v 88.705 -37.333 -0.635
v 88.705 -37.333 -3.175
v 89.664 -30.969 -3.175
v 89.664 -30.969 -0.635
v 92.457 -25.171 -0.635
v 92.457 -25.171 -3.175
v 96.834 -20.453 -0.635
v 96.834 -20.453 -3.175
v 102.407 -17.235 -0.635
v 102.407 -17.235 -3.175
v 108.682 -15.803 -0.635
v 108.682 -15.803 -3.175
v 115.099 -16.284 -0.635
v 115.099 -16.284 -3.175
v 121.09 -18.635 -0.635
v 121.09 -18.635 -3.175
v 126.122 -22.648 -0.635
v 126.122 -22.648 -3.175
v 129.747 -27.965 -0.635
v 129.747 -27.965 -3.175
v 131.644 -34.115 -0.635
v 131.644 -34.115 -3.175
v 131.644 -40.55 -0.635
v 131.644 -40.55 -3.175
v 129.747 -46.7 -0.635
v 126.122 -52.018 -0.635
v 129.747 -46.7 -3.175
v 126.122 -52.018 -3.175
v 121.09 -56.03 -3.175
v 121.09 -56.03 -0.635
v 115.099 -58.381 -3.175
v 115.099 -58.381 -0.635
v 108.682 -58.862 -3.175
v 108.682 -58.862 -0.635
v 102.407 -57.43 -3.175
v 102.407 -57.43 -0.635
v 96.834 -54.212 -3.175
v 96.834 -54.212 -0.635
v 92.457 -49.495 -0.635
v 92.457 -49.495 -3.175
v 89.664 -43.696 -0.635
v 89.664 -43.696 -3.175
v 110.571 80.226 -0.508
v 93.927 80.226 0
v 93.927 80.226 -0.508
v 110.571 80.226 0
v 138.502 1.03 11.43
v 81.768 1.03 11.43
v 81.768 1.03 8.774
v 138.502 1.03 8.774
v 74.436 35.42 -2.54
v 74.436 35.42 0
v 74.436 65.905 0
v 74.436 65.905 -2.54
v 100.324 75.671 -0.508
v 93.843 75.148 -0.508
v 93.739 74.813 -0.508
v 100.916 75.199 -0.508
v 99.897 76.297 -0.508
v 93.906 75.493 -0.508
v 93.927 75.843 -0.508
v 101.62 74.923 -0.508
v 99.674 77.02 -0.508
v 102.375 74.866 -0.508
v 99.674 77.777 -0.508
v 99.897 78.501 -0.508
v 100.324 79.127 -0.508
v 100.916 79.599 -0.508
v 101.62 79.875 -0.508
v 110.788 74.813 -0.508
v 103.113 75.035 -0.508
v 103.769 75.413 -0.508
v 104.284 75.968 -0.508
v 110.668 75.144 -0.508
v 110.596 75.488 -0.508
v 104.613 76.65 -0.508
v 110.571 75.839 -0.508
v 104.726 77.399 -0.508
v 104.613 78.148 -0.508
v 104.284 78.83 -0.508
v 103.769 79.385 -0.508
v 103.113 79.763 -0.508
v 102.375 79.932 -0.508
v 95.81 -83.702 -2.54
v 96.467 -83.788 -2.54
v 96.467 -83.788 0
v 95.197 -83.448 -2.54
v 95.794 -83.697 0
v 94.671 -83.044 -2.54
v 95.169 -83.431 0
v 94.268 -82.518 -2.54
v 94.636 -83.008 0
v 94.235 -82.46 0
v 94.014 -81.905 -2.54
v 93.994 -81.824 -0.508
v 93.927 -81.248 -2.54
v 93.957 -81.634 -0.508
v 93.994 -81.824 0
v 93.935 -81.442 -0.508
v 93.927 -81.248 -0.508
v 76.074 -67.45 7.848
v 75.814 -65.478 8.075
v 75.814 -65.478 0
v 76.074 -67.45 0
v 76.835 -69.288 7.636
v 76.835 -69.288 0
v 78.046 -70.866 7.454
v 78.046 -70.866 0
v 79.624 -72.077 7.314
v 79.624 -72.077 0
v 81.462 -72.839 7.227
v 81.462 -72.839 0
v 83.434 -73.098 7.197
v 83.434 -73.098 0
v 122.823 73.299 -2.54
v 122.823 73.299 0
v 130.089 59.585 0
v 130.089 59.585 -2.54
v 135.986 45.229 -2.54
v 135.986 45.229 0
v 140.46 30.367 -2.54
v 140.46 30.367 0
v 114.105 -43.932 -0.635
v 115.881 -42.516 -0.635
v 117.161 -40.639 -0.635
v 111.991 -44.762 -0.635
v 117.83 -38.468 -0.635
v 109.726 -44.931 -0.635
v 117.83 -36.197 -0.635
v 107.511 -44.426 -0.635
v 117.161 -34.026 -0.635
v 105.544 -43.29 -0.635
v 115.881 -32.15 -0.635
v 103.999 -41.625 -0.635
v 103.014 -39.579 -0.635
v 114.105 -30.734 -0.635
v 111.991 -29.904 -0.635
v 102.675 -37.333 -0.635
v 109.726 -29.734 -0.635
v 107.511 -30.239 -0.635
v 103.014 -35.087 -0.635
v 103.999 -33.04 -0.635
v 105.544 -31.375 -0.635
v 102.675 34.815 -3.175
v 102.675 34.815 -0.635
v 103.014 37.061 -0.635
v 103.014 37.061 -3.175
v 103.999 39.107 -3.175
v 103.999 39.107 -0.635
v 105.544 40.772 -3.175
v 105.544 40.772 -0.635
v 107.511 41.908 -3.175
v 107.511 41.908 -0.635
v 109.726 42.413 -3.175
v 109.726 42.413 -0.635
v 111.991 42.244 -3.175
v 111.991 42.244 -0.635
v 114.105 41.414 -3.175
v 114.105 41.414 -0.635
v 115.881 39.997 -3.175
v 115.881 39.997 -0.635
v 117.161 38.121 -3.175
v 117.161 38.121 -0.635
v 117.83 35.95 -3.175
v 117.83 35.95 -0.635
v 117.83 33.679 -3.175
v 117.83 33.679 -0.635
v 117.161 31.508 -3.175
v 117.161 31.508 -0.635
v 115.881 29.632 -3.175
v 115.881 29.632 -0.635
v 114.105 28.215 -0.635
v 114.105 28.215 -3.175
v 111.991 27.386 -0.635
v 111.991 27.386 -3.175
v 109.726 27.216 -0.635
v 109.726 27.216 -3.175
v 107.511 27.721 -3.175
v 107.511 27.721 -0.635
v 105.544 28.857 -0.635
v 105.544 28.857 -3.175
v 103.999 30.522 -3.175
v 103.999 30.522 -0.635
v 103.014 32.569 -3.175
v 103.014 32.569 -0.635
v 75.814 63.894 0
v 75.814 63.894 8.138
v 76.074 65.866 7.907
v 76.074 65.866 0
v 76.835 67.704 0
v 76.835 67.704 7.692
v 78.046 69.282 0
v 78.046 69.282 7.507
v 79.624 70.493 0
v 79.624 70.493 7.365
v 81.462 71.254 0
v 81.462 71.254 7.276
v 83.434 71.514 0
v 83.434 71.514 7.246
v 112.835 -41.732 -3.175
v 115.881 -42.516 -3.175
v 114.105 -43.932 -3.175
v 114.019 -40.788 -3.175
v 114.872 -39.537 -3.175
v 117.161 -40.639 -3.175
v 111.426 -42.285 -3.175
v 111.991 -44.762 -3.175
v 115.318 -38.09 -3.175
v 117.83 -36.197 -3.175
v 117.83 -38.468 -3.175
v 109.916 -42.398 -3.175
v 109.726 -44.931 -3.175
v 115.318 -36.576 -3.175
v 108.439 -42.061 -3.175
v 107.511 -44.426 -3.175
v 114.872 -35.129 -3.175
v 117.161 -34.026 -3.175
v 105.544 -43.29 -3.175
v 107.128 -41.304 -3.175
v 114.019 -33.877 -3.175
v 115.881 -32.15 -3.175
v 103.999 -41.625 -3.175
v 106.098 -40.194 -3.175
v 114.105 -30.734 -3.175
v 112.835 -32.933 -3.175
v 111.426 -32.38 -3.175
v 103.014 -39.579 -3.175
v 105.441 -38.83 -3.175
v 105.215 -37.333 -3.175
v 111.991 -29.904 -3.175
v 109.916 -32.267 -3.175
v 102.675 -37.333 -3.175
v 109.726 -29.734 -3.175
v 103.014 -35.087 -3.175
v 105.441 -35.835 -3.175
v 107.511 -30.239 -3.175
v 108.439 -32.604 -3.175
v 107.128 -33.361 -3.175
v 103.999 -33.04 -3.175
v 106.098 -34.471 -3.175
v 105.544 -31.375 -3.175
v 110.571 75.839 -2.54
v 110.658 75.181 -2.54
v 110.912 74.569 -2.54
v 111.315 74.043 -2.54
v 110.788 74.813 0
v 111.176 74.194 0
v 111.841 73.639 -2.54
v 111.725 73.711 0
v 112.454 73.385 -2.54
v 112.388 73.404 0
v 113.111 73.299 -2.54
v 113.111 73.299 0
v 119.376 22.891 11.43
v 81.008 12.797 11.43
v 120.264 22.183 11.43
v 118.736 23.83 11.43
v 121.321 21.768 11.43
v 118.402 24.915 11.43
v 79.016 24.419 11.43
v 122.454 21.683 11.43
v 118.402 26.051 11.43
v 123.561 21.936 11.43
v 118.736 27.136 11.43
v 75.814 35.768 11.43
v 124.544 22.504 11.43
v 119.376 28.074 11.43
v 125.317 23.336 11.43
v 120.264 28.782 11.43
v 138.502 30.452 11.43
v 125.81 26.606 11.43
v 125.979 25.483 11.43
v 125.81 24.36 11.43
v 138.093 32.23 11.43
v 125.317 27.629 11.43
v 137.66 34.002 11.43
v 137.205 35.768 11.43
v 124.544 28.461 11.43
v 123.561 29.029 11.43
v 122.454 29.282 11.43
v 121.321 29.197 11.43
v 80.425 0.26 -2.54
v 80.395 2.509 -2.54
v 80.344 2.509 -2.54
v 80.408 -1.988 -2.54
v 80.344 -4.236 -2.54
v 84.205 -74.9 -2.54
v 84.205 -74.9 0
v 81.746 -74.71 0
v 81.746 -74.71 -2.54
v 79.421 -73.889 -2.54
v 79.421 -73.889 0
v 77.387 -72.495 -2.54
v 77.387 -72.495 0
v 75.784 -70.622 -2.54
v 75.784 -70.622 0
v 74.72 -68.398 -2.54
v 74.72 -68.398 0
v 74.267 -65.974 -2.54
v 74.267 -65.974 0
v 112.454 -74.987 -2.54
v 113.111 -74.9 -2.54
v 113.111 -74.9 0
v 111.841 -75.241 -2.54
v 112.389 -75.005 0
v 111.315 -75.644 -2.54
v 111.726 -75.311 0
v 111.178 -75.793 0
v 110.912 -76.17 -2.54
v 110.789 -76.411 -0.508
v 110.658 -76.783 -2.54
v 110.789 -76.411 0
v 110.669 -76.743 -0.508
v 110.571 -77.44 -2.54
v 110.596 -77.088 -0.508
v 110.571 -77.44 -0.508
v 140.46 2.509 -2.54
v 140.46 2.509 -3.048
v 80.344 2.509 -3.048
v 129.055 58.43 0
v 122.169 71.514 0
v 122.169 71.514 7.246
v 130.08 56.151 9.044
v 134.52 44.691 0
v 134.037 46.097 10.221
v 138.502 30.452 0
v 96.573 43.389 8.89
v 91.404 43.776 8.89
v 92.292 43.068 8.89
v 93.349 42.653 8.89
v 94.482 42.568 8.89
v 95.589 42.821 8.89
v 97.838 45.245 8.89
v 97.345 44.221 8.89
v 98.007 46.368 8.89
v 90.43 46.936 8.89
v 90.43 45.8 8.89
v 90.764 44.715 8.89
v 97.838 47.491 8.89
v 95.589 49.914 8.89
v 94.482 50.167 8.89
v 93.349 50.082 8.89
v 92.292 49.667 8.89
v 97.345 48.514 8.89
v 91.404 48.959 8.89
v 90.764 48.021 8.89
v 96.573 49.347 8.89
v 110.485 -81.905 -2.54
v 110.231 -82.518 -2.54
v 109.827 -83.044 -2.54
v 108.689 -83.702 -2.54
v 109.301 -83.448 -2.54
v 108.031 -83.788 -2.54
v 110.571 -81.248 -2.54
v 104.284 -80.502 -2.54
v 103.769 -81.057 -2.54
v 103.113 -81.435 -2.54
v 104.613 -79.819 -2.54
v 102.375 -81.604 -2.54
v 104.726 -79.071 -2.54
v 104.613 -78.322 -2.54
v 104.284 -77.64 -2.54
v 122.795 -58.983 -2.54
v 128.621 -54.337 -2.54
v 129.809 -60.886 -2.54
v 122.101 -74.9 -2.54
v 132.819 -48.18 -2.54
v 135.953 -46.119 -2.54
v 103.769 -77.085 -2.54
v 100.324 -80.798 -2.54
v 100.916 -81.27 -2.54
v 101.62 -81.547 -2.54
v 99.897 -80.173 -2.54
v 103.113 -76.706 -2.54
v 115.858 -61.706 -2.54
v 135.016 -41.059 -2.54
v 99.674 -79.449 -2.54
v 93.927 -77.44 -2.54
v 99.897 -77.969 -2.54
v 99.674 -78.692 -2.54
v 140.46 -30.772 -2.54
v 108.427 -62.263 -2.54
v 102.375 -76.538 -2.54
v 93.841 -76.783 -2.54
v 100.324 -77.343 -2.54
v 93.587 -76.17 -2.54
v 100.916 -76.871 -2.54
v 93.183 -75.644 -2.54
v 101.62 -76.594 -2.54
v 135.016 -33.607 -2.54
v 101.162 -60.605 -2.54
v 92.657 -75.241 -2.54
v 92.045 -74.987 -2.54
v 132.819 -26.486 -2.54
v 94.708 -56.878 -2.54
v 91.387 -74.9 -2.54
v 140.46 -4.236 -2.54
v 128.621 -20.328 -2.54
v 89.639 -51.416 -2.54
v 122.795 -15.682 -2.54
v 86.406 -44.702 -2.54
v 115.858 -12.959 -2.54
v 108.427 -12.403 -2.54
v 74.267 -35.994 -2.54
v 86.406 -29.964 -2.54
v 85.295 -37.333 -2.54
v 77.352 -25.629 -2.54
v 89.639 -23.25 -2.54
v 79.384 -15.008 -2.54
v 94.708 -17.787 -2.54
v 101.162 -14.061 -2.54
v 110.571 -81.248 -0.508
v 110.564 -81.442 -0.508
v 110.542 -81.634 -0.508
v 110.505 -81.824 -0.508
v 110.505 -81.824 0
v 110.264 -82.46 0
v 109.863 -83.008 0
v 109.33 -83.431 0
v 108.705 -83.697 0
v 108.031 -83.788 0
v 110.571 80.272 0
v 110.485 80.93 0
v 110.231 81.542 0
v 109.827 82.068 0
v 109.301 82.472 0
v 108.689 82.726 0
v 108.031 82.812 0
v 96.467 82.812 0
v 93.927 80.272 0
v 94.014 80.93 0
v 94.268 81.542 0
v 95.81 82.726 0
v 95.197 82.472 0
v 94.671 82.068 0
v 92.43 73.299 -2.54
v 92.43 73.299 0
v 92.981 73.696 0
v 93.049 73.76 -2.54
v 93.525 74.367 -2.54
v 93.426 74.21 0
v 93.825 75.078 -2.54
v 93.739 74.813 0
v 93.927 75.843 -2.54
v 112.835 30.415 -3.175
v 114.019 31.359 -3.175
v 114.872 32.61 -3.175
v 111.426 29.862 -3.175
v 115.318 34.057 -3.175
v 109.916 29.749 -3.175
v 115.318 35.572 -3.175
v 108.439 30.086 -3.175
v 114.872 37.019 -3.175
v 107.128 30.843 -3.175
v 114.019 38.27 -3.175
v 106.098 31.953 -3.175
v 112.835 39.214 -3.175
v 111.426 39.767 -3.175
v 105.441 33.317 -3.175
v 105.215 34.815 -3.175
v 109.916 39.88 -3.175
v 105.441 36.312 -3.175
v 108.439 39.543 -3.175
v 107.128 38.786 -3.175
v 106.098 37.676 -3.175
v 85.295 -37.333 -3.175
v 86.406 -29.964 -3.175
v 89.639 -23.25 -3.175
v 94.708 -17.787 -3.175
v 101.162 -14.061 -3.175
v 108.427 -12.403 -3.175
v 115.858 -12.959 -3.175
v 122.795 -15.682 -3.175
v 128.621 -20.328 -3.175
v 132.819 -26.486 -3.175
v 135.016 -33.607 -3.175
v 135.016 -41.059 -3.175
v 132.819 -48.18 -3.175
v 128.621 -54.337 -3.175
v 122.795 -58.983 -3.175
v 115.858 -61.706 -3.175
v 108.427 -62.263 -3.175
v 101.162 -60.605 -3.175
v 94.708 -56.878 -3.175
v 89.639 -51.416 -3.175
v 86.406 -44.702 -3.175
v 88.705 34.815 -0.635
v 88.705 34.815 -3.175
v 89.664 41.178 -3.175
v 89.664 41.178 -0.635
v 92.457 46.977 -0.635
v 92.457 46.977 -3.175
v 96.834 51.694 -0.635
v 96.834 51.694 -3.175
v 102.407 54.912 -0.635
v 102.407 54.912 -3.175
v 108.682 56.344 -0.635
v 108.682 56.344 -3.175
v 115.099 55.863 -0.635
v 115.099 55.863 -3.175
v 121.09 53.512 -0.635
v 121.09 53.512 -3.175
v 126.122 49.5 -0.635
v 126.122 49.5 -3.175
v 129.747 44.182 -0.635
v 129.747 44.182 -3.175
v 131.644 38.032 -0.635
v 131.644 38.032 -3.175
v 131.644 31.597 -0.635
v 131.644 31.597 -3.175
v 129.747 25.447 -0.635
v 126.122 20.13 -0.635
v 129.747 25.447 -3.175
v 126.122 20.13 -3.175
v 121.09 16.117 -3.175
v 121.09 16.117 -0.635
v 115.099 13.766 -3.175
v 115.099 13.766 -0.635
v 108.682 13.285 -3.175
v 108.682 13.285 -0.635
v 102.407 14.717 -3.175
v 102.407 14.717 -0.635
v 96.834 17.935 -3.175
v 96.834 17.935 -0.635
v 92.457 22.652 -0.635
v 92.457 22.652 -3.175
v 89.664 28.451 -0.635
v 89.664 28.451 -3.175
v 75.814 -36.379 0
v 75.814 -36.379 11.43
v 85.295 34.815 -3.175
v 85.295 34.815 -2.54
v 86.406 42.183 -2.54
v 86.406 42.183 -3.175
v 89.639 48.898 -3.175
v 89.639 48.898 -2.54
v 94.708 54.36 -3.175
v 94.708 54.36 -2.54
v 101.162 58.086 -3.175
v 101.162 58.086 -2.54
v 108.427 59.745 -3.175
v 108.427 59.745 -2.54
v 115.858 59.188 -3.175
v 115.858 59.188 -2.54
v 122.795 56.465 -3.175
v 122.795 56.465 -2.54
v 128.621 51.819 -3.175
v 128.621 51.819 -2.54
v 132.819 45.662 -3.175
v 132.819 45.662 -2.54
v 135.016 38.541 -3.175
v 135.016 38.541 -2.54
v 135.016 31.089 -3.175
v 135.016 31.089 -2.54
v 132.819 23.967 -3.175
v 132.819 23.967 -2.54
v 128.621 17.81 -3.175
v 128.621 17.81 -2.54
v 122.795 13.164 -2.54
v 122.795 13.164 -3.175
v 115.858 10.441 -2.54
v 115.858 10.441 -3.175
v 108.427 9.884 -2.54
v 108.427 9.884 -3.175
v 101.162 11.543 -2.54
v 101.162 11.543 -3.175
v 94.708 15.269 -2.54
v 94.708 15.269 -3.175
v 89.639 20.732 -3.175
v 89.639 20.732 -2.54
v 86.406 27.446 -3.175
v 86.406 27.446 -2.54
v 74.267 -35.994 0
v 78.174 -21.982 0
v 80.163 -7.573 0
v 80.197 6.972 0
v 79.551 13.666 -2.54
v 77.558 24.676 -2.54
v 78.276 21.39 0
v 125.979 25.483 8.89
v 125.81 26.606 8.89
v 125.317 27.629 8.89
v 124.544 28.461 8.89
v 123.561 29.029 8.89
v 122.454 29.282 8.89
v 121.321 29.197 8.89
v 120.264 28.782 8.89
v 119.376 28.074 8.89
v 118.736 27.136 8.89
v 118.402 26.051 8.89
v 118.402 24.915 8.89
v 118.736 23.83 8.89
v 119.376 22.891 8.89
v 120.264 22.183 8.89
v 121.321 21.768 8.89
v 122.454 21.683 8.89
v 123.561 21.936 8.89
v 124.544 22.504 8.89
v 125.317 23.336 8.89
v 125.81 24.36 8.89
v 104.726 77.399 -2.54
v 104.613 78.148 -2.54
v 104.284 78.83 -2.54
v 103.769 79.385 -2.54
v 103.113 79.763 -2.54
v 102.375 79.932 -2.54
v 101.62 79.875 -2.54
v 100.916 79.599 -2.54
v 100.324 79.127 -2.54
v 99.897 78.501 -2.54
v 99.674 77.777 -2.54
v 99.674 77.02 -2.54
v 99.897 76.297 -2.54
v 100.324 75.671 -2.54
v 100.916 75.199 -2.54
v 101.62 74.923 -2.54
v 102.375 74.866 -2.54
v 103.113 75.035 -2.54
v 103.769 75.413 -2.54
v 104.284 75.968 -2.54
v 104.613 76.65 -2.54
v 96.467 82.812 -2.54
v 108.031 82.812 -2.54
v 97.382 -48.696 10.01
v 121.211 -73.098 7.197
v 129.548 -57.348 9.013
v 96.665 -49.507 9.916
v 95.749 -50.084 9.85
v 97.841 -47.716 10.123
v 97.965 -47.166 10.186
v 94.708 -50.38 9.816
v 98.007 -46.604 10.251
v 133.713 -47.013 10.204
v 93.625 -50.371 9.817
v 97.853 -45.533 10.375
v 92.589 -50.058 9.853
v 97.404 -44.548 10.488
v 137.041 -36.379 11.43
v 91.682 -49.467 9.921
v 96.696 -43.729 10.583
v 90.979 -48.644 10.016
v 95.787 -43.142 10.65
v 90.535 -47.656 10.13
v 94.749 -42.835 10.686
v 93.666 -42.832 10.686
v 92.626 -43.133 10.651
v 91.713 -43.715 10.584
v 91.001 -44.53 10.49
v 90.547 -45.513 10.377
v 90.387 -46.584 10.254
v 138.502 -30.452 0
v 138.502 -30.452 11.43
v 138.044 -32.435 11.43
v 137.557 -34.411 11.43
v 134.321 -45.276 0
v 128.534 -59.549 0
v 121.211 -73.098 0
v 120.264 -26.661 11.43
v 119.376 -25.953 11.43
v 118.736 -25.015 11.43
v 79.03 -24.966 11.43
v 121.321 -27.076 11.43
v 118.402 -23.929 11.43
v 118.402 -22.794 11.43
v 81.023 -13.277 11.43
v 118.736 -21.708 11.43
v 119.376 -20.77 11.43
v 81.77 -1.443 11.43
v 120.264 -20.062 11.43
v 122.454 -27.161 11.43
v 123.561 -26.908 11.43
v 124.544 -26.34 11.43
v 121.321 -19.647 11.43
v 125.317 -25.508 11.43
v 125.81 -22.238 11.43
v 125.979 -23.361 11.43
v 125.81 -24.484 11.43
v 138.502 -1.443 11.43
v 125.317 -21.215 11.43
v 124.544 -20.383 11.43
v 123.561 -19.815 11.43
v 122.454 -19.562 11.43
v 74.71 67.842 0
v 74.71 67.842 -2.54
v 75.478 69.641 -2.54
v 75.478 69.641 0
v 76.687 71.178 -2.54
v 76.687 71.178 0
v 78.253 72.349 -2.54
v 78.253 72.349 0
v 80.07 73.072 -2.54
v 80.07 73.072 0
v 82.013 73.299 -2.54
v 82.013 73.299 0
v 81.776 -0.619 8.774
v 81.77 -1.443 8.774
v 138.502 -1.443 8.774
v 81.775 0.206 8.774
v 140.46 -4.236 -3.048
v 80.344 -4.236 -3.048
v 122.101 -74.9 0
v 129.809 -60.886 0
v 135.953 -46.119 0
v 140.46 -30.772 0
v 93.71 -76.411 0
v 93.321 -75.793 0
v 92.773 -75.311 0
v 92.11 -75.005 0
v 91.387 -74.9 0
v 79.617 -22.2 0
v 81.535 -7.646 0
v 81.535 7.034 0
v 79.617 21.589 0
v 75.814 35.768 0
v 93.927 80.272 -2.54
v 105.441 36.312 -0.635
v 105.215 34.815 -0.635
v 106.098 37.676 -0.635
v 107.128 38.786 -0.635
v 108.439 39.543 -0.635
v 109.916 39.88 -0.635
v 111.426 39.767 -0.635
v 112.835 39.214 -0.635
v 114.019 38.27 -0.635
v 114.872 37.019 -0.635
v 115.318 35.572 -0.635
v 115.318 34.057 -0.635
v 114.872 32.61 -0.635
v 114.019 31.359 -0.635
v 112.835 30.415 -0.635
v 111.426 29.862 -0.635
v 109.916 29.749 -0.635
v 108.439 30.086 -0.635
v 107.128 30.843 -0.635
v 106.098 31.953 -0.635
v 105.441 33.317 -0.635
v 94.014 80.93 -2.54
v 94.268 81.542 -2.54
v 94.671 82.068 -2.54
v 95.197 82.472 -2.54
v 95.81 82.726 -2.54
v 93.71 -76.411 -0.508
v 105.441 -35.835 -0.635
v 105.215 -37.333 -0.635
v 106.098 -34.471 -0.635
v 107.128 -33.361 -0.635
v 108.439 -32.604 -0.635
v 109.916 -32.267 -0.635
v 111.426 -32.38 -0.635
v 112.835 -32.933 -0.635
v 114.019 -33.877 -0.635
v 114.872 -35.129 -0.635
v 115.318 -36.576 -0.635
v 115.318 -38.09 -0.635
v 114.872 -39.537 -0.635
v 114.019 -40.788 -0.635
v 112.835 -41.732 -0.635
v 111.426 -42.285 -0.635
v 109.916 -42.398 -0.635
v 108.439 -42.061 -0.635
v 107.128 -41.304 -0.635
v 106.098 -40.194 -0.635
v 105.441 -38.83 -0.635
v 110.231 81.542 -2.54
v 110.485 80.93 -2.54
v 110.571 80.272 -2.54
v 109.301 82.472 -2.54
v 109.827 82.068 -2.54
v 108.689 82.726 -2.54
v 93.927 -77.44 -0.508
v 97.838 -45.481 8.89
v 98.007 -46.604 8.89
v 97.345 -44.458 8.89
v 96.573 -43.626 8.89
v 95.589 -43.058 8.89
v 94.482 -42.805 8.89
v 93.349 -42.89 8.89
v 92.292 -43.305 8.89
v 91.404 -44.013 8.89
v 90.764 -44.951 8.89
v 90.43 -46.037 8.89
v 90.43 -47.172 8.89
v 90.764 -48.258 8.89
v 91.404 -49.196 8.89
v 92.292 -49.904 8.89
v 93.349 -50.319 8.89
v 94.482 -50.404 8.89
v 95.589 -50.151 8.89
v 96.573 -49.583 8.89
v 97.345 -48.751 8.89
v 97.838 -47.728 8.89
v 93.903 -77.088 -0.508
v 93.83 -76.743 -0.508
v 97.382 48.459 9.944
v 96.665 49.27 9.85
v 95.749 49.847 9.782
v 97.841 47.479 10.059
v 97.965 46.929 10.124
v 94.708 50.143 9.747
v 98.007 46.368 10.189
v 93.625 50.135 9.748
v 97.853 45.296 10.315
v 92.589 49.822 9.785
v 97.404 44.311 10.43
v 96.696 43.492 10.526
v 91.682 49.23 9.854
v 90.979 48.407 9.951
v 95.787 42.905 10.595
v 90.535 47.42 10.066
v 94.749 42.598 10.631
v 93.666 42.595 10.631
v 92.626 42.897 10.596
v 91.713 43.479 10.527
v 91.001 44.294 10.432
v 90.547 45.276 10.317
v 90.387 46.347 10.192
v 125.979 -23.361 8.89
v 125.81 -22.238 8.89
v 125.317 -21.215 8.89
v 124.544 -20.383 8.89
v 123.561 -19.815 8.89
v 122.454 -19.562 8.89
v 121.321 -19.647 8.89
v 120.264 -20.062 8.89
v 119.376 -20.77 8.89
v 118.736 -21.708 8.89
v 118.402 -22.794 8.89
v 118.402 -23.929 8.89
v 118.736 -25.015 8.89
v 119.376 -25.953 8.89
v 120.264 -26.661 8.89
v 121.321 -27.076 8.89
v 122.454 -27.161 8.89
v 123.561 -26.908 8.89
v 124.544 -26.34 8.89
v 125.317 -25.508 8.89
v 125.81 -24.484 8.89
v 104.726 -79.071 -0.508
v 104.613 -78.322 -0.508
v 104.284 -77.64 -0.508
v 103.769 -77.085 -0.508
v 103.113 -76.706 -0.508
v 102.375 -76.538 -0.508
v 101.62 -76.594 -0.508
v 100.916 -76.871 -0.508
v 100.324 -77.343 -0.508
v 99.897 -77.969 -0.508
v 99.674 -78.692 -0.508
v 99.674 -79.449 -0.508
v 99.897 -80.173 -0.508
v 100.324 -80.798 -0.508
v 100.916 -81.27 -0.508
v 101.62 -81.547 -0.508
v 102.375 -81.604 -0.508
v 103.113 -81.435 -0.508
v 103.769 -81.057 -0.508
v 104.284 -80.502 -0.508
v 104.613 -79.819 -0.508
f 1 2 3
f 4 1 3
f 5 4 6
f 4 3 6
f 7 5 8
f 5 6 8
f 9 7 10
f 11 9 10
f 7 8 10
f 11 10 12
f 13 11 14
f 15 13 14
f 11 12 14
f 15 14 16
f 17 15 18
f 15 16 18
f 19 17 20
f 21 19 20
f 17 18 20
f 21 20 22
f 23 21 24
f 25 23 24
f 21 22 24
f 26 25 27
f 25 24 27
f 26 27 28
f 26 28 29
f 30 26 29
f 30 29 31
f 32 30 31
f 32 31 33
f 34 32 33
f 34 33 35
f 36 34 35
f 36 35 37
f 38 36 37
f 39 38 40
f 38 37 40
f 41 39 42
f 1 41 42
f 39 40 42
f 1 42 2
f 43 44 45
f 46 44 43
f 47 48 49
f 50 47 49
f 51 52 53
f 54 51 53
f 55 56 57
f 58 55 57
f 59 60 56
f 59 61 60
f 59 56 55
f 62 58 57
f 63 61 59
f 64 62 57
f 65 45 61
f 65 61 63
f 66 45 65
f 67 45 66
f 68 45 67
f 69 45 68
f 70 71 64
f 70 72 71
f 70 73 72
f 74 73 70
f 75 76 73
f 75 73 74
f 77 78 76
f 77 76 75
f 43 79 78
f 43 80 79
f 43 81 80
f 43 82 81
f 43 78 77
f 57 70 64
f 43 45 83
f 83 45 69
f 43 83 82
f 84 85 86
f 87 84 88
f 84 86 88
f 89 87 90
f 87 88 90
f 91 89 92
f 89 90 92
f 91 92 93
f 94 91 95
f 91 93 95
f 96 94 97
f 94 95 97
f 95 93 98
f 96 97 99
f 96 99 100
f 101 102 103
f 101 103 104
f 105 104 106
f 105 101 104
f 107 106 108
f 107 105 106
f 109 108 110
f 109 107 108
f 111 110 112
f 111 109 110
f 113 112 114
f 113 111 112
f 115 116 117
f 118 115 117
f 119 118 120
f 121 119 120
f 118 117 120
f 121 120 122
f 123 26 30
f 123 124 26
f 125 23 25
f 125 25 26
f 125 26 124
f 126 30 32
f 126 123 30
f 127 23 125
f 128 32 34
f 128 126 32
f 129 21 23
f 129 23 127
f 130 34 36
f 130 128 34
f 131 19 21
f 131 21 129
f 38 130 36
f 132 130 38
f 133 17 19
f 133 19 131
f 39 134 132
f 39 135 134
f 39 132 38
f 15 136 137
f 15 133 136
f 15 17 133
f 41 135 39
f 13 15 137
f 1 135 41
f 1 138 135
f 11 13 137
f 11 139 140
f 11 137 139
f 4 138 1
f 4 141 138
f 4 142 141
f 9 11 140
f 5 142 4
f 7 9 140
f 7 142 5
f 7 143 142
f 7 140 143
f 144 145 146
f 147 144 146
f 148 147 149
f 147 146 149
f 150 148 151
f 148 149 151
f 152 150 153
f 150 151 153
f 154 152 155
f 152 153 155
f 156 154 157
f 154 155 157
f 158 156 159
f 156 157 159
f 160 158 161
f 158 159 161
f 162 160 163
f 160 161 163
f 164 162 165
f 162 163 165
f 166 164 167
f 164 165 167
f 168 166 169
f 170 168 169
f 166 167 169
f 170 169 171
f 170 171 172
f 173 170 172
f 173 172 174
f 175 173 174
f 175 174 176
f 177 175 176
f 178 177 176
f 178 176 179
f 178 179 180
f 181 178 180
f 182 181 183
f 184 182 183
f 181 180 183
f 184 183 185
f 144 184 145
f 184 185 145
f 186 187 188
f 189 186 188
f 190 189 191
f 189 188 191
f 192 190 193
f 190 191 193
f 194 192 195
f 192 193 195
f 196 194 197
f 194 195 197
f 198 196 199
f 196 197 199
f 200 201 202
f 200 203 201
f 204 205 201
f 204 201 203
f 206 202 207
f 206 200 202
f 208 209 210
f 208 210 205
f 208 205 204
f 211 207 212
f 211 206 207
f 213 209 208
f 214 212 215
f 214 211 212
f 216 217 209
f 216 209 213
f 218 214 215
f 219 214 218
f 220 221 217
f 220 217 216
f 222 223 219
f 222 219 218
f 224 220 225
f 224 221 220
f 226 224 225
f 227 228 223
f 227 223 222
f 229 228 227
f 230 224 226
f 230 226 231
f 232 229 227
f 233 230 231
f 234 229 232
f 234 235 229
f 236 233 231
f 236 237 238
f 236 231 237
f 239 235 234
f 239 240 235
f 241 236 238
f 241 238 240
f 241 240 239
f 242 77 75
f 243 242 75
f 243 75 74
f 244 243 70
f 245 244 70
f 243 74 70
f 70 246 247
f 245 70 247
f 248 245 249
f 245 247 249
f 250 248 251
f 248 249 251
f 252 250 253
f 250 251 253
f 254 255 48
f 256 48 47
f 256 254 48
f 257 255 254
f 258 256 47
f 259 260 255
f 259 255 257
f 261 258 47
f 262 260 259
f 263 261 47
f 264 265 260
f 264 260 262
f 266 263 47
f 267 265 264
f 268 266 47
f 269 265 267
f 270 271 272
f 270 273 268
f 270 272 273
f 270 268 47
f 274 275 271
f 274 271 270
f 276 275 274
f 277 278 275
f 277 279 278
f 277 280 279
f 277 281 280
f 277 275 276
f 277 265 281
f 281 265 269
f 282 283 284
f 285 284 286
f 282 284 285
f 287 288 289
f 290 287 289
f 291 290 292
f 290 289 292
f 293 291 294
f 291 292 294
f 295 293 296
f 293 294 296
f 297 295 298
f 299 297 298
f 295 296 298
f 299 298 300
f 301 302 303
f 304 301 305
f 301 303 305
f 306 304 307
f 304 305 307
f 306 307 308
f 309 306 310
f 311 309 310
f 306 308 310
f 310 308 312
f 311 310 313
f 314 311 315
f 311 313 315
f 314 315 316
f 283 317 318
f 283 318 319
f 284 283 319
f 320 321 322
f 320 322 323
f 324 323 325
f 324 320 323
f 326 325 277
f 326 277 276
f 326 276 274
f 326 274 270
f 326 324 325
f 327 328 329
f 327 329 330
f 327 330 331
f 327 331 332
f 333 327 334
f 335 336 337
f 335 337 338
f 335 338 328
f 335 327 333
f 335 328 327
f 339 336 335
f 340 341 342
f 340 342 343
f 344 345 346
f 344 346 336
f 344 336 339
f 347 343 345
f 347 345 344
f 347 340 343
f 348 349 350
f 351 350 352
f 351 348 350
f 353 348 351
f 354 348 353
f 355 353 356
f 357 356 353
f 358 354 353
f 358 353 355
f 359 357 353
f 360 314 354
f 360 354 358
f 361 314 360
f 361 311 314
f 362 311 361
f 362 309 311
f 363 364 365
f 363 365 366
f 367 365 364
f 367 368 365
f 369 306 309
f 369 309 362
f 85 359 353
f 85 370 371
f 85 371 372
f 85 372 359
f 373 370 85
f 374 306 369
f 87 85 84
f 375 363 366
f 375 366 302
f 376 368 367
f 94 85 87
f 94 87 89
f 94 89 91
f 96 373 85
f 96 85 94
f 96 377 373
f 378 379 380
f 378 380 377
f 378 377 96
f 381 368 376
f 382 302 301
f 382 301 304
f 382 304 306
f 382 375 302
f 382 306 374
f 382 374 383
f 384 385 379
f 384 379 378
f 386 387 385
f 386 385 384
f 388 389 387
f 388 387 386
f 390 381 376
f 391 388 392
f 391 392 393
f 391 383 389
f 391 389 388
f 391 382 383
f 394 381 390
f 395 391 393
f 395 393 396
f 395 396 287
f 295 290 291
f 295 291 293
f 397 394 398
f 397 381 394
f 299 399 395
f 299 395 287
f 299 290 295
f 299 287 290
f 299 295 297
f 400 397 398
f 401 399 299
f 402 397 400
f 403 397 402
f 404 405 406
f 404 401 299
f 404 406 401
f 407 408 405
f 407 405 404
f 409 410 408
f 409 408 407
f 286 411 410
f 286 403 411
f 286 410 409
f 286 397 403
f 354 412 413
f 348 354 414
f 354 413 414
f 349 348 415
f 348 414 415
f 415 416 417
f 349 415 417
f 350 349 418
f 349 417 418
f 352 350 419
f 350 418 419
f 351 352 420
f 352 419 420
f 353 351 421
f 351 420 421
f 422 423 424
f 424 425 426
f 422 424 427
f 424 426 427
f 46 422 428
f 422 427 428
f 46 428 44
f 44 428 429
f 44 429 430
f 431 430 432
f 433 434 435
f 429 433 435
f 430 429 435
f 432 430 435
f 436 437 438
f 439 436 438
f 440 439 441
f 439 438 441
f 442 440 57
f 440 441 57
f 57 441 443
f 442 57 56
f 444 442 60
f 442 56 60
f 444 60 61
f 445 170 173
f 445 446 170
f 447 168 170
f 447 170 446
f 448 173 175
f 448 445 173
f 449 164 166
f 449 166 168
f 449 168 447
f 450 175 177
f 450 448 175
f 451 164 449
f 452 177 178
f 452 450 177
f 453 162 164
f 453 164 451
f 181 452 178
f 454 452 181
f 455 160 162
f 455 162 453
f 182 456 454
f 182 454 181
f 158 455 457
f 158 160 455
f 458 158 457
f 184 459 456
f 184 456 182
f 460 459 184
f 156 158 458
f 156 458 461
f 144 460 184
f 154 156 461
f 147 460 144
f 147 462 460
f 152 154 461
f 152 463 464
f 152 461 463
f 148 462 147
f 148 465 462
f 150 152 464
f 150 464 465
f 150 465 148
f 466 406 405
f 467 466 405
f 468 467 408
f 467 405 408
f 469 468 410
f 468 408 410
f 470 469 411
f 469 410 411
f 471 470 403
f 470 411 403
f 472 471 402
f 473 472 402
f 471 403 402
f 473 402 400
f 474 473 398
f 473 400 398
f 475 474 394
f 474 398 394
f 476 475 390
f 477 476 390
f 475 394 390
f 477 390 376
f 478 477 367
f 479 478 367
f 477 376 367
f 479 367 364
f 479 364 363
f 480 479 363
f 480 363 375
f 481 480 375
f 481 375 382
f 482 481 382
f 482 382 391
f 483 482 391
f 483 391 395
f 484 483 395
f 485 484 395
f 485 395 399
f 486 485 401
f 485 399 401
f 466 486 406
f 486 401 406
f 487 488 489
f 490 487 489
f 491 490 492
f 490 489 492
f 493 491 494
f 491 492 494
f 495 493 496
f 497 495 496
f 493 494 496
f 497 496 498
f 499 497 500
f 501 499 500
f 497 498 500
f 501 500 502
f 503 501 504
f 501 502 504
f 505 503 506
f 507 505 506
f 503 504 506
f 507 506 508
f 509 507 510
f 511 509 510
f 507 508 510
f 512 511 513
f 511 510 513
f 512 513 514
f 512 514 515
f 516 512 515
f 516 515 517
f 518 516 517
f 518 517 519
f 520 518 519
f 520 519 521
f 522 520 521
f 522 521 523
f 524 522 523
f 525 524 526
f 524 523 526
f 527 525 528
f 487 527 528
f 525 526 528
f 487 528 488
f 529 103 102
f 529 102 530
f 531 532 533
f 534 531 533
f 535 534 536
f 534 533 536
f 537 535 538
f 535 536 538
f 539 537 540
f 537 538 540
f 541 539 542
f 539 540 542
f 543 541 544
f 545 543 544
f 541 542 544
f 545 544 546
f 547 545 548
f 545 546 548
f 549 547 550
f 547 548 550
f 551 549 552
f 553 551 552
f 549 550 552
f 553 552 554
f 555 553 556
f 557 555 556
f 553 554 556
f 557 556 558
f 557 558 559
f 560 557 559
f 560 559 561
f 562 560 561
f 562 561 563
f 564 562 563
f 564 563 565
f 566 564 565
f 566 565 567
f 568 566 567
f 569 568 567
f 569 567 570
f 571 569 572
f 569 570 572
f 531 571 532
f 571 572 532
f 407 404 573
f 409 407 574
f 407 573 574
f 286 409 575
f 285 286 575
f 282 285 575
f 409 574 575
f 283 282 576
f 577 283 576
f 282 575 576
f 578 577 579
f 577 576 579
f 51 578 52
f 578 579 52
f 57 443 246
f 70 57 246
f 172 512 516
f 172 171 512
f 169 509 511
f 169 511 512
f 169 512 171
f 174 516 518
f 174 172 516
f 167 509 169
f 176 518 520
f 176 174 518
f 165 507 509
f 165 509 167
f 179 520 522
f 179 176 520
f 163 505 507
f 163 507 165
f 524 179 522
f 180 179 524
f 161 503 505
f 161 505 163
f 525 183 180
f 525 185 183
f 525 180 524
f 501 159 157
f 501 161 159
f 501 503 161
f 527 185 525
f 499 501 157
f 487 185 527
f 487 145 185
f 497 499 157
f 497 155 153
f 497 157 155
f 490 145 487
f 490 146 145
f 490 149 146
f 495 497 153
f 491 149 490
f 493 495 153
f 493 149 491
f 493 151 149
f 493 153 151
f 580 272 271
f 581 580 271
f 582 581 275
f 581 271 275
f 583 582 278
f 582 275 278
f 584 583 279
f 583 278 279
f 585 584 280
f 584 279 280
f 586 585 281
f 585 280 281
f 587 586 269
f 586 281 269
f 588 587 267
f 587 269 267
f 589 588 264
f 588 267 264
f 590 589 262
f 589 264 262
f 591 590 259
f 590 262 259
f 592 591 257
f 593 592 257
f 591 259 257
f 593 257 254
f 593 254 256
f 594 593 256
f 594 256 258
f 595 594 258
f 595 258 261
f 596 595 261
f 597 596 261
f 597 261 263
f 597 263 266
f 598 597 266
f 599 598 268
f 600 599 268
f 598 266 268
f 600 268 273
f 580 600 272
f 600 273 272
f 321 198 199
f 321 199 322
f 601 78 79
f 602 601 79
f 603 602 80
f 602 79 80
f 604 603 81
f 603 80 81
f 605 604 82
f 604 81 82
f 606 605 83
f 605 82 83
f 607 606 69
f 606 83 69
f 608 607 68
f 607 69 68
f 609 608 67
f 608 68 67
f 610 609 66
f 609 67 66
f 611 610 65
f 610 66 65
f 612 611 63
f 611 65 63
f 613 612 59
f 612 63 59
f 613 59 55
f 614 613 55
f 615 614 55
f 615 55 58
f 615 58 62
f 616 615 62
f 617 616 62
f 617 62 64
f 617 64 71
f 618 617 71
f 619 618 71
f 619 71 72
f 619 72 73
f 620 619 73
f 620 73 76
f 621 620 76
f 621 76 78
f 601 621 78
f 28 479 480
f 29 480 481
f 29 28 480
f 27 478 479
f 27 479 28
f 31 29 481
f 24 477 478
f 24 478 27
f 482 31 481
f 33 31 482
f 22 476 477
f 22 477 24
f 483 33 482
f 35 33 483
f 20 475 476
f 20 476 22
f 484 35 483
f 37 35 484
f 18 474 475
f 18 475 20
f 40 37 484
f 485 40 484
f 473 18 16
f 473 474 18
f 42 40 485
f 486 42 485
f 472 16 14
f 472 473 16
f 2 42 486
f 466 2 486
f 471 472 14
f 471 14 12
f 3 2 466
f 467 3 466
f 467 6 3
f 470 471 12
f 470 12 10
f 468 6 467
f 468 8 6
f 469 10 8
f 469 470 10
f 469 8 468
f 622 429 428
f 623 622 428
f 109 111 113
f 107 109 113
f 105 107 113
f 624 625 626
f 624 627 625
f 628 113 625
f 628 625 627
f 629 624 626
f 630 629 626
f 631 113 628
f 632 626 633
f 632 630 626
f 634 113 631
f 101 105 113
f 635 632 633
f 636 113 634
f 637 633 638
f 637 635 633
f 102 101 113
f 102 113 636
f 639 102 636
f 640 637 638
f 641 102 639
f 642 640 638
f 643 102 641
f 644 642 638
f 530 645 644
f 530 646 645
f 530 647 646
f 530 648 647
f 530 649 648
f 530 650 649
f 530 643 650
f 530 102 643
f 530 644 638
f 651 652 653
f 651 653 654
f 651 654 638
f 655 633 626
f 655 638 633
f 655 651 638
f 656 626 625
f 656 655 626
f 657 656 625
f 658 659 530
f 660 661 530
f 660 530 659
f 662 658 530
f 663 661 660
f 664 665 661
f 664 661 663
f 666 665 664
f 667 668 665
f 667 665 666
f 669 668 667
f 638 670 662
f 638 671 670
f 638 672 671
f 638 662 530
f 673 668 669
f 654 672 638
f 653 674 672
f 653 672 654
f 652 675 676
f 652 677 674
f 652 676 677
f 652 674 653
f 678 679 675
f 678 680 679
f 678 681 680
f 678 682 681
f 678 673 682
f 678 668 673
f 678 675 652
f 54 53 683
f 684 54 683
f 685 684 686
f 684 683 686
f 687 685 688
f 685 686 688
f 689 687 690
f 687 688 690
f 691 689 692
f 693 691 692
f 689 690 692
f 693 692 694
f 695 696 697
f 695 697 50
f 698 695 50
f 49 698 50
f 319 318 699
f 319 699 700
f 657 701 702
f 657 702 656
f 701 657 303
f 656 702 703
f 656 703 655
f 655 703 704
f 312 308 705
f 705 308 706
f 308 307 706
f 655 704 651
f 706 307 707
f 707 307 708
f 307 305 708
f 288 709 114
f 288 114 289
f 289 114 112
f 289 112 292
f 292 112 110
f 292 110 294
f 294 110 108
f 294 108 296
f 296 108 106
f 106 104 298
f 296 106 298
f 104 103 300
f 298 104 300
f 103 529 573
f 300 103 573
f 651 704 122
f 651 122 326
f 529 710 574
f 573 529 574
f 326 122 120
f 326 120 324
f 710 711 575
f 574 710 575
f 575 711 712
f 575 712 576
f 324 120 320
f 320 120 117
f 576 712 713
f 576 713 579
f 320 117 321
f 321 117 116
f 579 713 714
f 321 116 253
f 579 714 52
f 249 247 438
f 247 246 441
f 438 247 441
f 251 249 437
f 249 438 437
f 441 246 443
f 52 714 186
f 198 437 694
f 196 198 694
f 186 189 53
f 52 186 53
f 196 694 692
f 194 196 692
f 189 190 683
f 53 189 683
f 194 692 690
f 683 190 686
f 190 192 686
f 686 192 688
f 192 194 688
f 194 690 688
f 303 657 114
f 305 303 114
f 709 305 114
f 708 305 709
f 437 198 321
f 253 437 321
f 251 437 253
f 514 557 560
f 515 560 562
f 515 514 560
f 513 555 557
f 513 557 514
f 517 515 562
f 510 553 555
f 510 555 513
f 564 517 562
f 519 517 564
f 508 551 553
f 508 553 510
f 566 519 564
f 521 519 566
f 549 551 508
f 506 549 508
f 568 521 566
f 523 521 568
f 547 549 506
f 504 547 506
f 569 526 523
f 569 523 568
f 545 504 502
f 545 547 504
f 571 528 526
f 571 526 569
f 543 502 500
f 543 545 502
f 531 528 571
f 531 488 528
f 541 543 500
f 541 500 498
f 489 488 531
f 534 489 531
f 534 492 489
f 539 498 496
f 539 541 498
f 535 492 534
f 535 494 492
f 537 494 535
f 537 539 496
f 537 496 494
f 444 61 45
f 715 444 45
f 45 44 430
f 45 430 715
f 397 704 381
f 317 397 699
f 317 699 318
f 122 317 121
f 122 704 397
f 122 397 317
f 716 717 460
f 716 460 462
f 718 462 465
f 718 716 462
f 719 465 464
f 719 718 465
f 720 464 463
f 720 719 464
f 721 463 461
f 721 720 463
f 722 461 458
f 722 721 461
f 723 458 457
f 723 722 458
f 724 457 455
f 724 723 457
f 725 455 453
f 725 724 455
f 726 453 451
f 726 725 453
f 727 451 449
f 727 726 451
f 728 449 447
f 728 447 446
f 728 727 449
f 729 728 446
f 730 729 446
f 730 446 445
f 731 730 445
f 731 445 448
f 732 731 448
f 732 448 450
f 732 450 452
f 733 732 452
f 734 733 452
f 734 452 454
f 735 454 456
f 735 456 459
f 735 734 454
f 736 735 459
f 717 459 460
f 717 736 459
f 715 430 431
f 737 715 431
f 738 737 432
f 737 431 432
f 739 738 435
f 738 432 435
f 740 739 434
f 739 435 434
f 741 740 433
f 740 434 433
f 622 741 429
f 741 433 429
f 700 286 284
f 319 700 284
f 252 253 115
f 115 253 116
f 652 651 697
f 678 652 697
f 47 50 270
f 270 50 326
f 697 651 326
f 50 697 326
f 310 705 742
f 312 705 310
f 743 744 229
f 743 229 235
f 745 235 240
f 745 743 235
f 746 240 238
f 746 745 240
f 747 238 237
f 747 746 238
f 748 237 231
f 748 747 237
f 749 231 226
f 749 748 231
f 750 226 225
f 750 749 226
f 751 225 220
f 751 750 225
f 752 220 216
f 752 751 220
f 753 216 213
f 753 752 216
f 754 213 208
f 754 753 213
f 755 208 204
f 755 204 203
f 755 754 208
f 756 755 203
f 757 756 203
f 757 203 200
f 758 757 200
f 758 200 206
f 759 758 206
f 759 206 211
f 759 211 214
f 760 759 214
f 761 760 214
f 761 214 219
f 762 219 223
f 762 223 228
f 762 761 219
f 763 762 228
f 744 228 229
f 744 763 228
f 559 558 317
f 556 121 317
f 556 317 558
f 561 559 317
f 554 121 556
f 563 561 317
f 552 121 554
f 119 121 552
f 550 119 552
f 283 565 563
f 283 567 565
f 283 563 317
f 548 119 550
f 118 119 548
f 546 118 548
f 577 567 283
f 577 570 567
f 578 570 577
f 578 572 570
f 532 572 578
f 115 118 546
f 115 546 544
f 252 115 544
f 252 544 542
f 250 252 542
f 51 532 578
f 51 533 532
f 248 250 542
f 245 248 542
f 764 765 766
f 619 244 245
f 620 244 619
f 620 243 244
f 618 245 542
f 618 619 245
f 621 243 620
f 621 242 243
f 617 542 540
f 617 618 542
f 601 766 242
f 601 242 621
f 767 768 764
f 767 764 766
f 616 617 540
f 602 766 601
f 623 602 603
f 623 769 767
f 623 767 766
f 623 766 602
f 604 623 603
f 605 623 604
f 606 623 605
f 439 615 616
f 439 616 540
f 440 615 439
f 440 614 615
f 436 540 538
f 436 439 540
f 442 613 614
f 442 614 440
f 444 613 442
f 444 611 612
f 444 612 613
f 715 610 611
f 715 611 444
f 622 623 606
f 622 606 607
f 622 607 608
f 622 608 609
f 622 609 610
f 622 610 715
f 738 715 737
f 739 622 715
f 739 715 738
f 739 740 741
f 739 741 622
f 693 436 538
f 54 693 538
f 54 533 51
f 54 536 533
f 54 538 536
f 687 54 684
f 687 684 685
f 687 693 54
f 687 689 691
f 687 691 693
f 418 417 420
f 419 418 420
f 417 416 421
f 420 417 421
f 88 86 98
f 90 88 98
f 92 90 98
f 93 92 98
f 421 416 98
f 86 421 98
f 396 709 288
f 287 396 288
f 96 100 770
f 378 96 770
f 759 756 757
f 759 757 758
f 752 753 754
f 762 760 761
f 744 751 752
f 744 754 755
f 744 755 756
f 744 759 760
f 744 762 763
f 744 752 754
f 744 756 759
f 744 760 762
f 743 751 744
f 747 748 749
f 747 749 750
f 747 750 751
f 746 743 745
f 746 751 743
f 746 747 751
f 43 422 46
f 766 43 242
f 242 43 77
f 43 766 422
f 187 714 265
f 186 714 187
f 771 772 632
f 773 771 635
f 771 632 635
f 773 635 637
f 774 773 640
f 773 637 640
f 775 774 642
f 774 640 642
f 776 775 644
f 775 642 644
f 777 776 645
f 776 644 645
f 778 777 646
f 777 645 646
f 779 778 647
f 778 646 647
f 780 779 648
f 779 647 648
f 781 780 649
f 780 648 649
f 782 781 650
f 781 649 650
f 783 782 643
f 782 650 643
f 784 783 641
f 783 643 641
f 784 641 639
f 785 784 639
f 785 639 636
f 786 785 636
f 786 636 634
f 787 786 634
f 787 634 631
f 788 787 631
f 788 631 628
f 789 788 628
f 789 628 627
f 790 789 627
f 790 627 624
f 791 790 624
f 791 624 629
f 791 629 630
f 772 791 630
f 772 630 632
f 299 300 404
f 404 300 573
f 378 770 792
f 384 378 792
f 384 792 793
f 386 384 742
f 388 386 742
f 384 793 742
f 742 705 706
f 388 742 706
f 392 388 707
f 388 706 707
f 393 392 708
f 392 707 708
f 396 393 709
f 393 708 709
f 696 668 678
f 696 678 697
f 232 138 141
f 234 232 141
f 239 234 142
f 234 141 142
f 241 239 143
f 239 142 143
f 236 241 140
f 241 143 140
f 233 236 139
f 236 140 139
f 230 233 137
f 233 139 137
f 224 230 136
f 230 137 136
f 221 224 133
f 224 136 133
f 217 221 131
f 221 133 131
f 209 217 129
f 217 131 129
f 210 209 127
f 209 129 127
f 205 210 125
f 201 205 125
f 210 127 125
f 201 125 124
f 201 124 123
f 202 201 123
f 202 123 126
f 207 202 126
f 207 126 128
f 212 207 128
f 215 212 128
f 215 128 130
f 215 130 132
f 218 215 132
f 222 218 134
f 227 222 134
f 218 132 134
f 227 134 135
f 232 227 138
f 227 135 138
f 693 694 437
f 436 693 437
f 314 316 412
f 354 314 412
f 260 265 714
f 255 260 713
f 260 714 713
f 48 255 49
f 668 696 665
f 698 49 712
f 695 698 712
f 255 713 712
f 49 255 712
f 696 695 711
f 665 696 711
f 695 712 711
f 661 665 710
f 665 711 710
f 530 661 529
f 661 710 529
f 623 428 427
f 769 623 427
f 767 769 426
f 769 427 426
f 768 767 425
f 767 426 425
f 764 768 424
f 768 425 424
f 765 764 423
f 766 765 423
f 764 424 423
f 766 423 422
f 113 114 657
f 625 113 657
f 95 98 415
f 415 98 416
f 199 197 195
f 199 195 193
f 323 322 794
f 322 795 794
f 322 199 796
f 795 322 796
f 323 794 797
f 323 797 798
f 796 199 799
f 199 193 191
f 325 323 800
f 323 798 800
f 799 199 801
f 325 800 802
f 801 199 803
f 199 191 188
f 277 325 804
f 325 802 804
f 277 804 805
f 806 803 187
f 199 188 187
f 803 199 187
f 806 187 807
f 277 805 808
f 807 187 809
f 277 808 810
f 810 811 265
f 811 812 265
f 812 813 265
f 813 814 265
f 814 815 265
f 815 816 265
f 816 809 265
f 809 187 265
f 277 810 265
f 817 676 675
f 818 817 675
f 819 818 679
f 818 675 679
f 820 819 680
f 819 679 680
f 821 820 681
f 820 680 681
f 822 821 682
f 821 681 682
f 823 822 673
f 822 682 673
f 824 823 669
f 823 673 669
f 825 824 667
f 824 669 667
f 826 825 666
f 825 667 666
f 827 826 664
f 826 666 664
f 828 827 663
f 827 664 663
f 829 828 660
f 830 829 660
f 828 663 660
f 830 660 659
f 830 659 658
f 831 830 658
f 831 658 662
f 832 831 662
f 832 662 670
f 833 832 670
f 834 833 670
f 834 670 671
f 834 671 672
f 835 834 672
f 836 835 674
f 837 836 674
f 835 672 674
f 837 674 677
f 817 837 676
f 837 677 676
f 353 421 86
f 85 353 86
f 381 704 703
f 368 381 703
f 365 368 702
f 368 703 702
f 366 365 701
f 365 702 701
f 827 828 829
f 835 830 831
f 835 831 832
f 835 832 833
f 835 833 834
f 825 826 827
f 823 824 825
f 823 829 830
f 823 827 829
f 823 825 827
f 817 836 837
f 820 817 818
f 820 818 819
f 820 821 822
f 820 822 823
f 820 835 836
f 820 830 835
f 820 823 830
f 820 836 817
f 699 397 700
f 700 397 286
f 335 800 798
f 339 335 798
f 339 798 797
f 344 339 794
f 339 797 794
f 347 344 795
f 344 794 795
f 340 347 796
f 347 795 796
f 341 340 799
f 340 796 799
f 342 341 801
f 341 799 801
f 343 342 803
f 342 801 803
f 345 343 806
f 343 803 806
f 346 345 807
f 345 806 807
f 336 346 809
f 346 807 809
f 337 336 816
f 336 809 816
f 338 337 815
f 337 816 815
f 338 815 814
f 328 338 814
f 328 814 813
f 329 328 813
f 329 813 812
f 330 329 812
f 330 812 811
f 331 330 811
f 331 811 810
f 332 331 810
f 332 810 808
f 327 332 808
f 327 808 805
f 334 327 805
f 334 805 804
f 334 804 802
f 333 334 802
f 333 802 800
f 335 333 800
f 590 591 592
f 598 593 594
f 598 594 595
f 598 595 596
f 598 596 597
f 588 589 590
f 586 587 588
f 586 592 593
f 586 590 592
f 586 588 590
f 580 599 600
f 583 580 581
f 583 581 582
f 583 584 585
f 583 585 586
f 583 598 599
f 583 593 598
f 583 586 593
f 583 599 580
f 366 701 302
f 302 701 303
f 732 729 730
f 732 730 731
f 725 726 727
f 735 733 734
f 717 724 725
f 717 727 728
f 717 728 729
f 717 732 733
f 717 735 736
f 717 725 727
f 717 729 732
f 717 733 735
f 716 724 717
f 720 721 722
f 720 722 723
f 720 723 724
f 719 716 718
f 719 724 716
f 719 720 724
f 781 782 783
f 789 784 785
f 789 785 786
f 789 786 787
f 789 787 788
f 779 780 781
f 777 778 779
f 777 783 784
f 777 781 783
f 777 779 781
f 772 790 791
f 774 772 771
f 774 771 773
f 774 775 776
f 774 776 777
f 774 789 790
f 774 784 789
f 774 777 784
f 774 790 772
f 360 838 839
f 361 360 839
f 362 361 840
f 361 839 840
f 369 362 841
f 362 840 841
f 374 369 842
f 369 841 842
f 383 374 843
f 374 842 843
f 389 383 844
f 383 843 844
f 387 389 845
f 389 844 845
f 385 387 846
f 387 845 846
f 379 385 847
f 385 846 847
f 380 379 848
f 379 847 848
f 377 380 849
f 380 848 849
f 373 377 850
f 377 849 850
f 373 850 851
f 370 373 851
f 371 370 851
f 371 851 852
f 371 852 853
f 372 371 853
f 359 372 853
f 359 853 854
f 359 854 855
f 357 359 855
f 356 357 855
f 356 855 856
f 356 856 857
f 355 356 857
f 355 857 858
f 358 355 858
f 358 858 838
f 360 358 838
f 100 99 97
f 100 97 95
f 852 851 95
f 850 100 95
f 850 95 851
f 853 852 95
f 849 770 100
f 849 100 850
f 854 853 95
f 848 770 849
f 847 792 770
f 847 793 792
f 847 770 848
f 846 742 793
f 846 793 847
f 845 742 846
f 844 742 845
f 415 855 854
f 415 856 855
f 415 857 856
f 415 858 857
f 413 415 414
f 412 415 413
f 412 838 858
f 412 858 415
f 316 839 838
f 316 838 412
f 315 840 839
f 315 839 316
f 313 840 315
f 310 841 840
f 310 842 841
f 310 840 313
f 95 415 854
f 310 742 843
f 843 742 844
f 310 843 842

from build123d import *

# Parameters (mm, degrees)
SKETCH2_W               = 62.687945492
SKETCH2_H               = 144.612264151
EXTRUDE1_DEPTH          = 11.43
CUT_EXTRUDE2_DEPTH      = 158.024733797
CUT_EXTRUDE2_DEPTH_BACK = 158.024733797
FILLET1_R               = 7.62
CUT_EXTRUDE3_DEPTH      = 158.024733797
CUT_EXTRUDE4_DEPTH      = 11.43
SKETCH6_W               = 12.479780257
SKETCH6_H               = 2.472828988
CUT_EXTRUDE5_DEPTH      = 158.024733797
SKETCH7_R               = 3.81
CUT_EXTRUDE6_DEPTH      = 2.54
EXTRUDE2_DEPTH          = 2.54
SKETCH13_R              = 25
EXTRUDE4_DEPTH          = 0.635
SKETCH14_R              = 21.59
CUT_EXTRUDE7_DEPTH      = 2.54
SKETCH15_R              = 7.62
SKETCH15_R_2            = 5.08
EXTRUDE5_DEPTH          = 2.54
SKETCH16_R              = 2.54
CUT_EXTRUDE8_DEPTH      = 164.951198757
SKETCH17_W              = 37.108426787
SKETCH17_H              = 5.41310776
CUT_EXTRUDE9_DEPTH      = 0.508
SKETCH18_W              = 60.115740974
SKETCH18_H              = 6.745649024
EXTRUDE6_DEPTH          = 0.508


# Read off the part's stored shape, not the designer's step: Cut-Extrude4
with BuildPart() as part:
    # Sketch2 → Extrude1 (new body)
    with BuildSketch(Plane.XY):
        with Locations((107.157914046, -0.792085953)):
            Rectangle(SKETCH2_W, SKETCH2_H)
    extrude(amount=EXTRUDE1_DEPTH)

    # Sketch3 → Cut-Extrude2 (cut, two sides: drawn at the far end of the back side and taken through both)
    with BuildSketch(Plane.XY.offset(11.43).offset(-CUT_EXTRUDE2_DEPTH_BACK)):
        with BuildLine():
            Line((-8.245884216, 283.124432333), (75.8139413, 35.767808979))
            ThreePointArc((75.8139413, 35.767808979), (81.776003849, -0.305809979), (75.8139413, -36.379428938))
            Line((75.8139413, -36.379428938), (-8.245884216, -283.736052291))
            Line((-8.245884216, -283.736052291), (-530.745083766, -283.736052291))
            Line((-530.745083766, -283.736052291), (-530.745083766, 283.124432333))
            Line((-530.745083766, 283.124432333), (-8.245884216, 283.124432333))
        make_face()
    extrude(amount=CUT_EXTRUDE2_DEPTH + CUT_EXTRUDE2_DEPTH_BACK, mode=Mode.SUBTRACT)

    # Fillet1
    fillet1_edges = [part.edges().sort_by_distance(p)[0] for p in [
        (75.8139413, 71.514046122, 5.715),
        (138.501886792, 71.514046122, 5.715),
        (138.501886792, -73.098218029, 5.715),
        (75.8139413, -73.098218029, 5.715),
    ]]
    fillet(fillet1_edges, radius=FILLET1_R)

    # Sketch4 → Cut-Extrude3 (cut, through all)
    with BuildSketch(Plane(origin=(0, 0, 0), x_dir=(0, 0, -1), z_dir=(1, 0, 0))):
        Polygon((-6.9650624, -75.107104489), (-11.43, -36.379428938), (-27.808277113, -36.379428938), (-27.808277113, -75.107104489), align=None)
        Polygon((-6.9650624, 73.913379264), (-11.43, 35.767808979), (-27.808277113, 35.767808979), (-27.808277113, 73.913379264), align=None)
    extrude(amount=CUT_EXTRUDE3_DEPTH, mode=Mode.SUBTRACT)

    # Cut-Extrude4 outline → Cut-Extrude4 (cut)
    with BuildSketch(Plane.XY):
        with BuildLine():
            Line((130.881886792, 71.514046122), (122.168957501, 71.514046122))
            ThreePointArc((122.168957501, 71.514046122), (131.969322241, 51.63307619), (138.501886792, 30.452289734))
            Line((138.501886792, 30.452289734), (138.501886792, 63.894046122))
            ThreePointArc((138.501886792, 63.894046122), (136.270040464, 69.282199795), (130.881886792, 71.514046122))
        make_face()
        with BuildLine():
            Line((138.501886792, -65.478218029), (138.501886792, -30.452289734))
            ThreePointArc((138.501886792, -30.452289734), (131.624319899, -52.492129451), (121.210647413, -73.098218029))
            Line((121.210647413, -73.098218029), (130.881886792, -73.098218029))
            ThreePointArc((130.881886792, -73.098218029), (136.270040465, -70.866371702), (138.501886792, -65.478218029))
        make_face()
    extrude(amount=CUT_EXTRUDE4_DEPTH, mode=Mode.SUBTRACT)

    # Sketch6 → Cut-Extrude5 (cut, through all)
    with BuildSketch(Plane(origin=(0, 0, 0), x_dir=(0, 0, -1), z_dir=(1, 0, 0))):
        with Locations((-15.014254811, -0.20641593)):
            Rectangle(SKETCH6_W, SKETCH6_H)
    extrude(amount=CUT_EXTRUDE5_DEPTH, mode=Mode.SUBTRACT)

    # Sketch7 → Cut-Extrude6 (cut)
    with BuildSketch(Plane.XY.offset(11.43)):
        with Locations((122.168957501, 25.482679021)):
            Circle(SKETCH7_R)
        with Locations((122.168957501, -23.361435355)):
            Circle(SKETCH7_R)
        with Locations((94.197047539, -46.60449668)):
            Circle(SKETCH7_R)
        with Locations((94.197047539, 46.367748617)):
            Circle(SKETCH7_R)
    extrude(amount=-CUT_EXTRUDE6_DEPTH, mode=Mode.SUBTRACT)

    # Sketch11 → Extrude2 (add)
    with BuildSketch(Plane.XY):
        with BuildLine():
            Line((140.459634853, 30.367090459), (140.459634853, -30.772266502))
            ThreePointArc((140.459634853, -30.772266502), (133.081559649, -53.585706853), (122.100984967, -74.900397422))
            Line((122.100984967, -74.900397422), (113.111333503, -74.900397422))
            ThreePointArc((113.111333503, -74.900397422), (111.315282279, -75.644346198), (110.571333503, -77.440397422))
            Line((110.571333503, -77.440397422), (110.571333503, -81.248075827))
            ThreePointArc((110.571333503, -81.248075827), (109.827384728, -83.044127051), (108.031333503, -83.788075827))
            Line((108.031333503, -83.788075827), (96.467437878, -83.788075827))
            ThreePointArc((96.467437878, -83.788075827), (94.671386654, -83.044127051), (93.927437878, -81.248075827))
            Line((93.927437878, -81.248075827), (93.927437878, -77.440397422))
            ThreePointArc((93.927437878, -77.440397422), (93.183489102, -75.644346198), (91.387437878, -74.900397422))
            Line((91.387437878, -74.900397422), (84.20468933, -74.900397422))
            ThreePointArc((84.20468933, -74.900397422), (77.387287325, -72.495127974), (74.267438474, -65.97371445))
            Line((74.267438474, -65.97371445), (74.267438474, -35.993533901))
            ThreePointArc((74.267438474, -35.993533901), (80.424902626, -0.301125715), (74.435866454, 35.419929877))
            Line((74.435866454, 35.419929877), (74.435866454, 65.905394367))
            ThreePointArc((74.435866454, 65.905394367), (76.686596692, 71.178053101), (82.012839907, 73.298866609))
            Line((82.012839907, 73.298866609), (92.429737879, 73.298866609))
            ThreePointArc((92.429737879, 73.298866609), (93.525213934, 74.366945407), (93.927437878, 75.843114776))
            Line((93.927437878, 75.843114776), (93.927437878, 80.272142364))
            ThreePointArc((93.927437878, 80.272142364), (94.671386654, 82.068193588), (96.467437878, 82.812142364))
            Line((96.467437878, 82.812142364), (108.031333503, 82.812142364))
            ThreePointArc((108.031333503, 82.812142364), (109.827384728, 82.068193588), (110.571333503, 80.272142364))
            Line((110.571333503, 80.272142364), (110.571333503, 75.838866609))
            ThreePointArc((110.571333503, 75.838866609), (111.315282279, 74.042815385), (113.111333503, 73.298866609))
            Line((113.111333503, 73.298866609), (122.822960943, 73.298866609))
            ThreePointArc((122.822960943, 73.298866609), (133.212311059, 52.478361728), (140.459634853, 30.367090459))
        make_face()
    extrude(amount=-EXTRUDE2_DEPTH)

    # Sketch13 → Extrude4 (add)
    with BuildSketch(Plane(origin=(202.435743002, 23.123502913, -2.54), x_dir=(-1, 0, 0), z_dir=(0, 0, -1))):
        with Locations((92.140594683, 11.691074744)):
            Circle(SKETCH13_R)
        with Locations((92.140594683, -60.456163173)):
            Circle(SKETCH13_R)
    extrude(amount=EXTRUDE4_DEPTH)

    # Sketch14 → Cut-Extrude7 (cut)
    with BuildSketch(Plane(origin=(0, 0, -3.175), x_dir=(-1, 0, 0), z_dir=(0, 0, -1))):
        with Locations((-110.295148318, 34.814577657)):
            Circle(SKETCH14_R)
        with Locations((-110.295148318, -37.332660261)):
            Circle(SKETCH14_R)
    extrude(amount=-CUT_EXTRUDE7_DEPTH, mode=Mode.SUBTRACT)

    # Sketch15 → Extrude5 (add)
    # profile 1 of 2: a face of its own
    with BuildSketch(Plane(origin=(0, 0, -0.635), x_dir=(-1, 0, 0), z_dir=(0, 0, -1))):
        with Locations((-110.295148318, 34.814577657)):
            Circle(SKETCH15_R)
        with Locations((-110.295148318, 34.814577657)):
            Circle(SKETCH15_R_2, mode=Mode.SUBTRACT)
    # profile 2 of 2: a face of its own
    with BuildSketch(Plane(origin=(0, 0, -0.635), x_dir=(-1, 0, 0), z_dir=(0, 0, -1))):
        with Locations((-110.295148318, -37.332660261)):
            Circle(SKETCH15_R)
        with Locations((-110.295148318, -37.332660261)):
            Circle(SKETCH15_R_2, mode=Mode.SUBTRACT)
    extrude(amount=EXTRUDE5_DEPTH)

    # Sketch16 → Cut-Extrude8 (cut, through all)
    with BuildSketch(Plane.XY):
        with Locations((102.185519341, 77.398921819)):
            Circle(SKETCH16_R)
        with Locations((102.185519341, -79.070725904)):
            Circle(SKETCH16_R)
    extrude(amount=-CUT_EXTRUDE8_DEPTH, mode=Mode.SUBTRACT)

    # Sketch17 → Cut-Extrude9 (cut)
    with BuildSketch(Plane.XY):
        with Locations((105.706841443, -79.117825298)):
            Rectangle(SKETCH17_W, SKETCH17_H)
        with Locations((105.628622382, 77.519388414)):
            Rectangle(SKETCH17_W, SKETCH17_H)
    extrude(amount=-CUT_EXTRUDE9_DEPTH, mode=Mode.SUBTRACT)

    # Sketch18 → Extrude6 (add)
    with BuildSketch(Plane(origin=(0, 0, -2.54), x_dir=(-1, 0, 0), z_dir=(0, 0, -1))):
        with Locations((-110.401764366, -0.863643629)):
            Rectangle(SKETCH18_W, SKETCH18_H)
    extrude(amount=EXTRUDE6_DEPTH)


solid = part.part
